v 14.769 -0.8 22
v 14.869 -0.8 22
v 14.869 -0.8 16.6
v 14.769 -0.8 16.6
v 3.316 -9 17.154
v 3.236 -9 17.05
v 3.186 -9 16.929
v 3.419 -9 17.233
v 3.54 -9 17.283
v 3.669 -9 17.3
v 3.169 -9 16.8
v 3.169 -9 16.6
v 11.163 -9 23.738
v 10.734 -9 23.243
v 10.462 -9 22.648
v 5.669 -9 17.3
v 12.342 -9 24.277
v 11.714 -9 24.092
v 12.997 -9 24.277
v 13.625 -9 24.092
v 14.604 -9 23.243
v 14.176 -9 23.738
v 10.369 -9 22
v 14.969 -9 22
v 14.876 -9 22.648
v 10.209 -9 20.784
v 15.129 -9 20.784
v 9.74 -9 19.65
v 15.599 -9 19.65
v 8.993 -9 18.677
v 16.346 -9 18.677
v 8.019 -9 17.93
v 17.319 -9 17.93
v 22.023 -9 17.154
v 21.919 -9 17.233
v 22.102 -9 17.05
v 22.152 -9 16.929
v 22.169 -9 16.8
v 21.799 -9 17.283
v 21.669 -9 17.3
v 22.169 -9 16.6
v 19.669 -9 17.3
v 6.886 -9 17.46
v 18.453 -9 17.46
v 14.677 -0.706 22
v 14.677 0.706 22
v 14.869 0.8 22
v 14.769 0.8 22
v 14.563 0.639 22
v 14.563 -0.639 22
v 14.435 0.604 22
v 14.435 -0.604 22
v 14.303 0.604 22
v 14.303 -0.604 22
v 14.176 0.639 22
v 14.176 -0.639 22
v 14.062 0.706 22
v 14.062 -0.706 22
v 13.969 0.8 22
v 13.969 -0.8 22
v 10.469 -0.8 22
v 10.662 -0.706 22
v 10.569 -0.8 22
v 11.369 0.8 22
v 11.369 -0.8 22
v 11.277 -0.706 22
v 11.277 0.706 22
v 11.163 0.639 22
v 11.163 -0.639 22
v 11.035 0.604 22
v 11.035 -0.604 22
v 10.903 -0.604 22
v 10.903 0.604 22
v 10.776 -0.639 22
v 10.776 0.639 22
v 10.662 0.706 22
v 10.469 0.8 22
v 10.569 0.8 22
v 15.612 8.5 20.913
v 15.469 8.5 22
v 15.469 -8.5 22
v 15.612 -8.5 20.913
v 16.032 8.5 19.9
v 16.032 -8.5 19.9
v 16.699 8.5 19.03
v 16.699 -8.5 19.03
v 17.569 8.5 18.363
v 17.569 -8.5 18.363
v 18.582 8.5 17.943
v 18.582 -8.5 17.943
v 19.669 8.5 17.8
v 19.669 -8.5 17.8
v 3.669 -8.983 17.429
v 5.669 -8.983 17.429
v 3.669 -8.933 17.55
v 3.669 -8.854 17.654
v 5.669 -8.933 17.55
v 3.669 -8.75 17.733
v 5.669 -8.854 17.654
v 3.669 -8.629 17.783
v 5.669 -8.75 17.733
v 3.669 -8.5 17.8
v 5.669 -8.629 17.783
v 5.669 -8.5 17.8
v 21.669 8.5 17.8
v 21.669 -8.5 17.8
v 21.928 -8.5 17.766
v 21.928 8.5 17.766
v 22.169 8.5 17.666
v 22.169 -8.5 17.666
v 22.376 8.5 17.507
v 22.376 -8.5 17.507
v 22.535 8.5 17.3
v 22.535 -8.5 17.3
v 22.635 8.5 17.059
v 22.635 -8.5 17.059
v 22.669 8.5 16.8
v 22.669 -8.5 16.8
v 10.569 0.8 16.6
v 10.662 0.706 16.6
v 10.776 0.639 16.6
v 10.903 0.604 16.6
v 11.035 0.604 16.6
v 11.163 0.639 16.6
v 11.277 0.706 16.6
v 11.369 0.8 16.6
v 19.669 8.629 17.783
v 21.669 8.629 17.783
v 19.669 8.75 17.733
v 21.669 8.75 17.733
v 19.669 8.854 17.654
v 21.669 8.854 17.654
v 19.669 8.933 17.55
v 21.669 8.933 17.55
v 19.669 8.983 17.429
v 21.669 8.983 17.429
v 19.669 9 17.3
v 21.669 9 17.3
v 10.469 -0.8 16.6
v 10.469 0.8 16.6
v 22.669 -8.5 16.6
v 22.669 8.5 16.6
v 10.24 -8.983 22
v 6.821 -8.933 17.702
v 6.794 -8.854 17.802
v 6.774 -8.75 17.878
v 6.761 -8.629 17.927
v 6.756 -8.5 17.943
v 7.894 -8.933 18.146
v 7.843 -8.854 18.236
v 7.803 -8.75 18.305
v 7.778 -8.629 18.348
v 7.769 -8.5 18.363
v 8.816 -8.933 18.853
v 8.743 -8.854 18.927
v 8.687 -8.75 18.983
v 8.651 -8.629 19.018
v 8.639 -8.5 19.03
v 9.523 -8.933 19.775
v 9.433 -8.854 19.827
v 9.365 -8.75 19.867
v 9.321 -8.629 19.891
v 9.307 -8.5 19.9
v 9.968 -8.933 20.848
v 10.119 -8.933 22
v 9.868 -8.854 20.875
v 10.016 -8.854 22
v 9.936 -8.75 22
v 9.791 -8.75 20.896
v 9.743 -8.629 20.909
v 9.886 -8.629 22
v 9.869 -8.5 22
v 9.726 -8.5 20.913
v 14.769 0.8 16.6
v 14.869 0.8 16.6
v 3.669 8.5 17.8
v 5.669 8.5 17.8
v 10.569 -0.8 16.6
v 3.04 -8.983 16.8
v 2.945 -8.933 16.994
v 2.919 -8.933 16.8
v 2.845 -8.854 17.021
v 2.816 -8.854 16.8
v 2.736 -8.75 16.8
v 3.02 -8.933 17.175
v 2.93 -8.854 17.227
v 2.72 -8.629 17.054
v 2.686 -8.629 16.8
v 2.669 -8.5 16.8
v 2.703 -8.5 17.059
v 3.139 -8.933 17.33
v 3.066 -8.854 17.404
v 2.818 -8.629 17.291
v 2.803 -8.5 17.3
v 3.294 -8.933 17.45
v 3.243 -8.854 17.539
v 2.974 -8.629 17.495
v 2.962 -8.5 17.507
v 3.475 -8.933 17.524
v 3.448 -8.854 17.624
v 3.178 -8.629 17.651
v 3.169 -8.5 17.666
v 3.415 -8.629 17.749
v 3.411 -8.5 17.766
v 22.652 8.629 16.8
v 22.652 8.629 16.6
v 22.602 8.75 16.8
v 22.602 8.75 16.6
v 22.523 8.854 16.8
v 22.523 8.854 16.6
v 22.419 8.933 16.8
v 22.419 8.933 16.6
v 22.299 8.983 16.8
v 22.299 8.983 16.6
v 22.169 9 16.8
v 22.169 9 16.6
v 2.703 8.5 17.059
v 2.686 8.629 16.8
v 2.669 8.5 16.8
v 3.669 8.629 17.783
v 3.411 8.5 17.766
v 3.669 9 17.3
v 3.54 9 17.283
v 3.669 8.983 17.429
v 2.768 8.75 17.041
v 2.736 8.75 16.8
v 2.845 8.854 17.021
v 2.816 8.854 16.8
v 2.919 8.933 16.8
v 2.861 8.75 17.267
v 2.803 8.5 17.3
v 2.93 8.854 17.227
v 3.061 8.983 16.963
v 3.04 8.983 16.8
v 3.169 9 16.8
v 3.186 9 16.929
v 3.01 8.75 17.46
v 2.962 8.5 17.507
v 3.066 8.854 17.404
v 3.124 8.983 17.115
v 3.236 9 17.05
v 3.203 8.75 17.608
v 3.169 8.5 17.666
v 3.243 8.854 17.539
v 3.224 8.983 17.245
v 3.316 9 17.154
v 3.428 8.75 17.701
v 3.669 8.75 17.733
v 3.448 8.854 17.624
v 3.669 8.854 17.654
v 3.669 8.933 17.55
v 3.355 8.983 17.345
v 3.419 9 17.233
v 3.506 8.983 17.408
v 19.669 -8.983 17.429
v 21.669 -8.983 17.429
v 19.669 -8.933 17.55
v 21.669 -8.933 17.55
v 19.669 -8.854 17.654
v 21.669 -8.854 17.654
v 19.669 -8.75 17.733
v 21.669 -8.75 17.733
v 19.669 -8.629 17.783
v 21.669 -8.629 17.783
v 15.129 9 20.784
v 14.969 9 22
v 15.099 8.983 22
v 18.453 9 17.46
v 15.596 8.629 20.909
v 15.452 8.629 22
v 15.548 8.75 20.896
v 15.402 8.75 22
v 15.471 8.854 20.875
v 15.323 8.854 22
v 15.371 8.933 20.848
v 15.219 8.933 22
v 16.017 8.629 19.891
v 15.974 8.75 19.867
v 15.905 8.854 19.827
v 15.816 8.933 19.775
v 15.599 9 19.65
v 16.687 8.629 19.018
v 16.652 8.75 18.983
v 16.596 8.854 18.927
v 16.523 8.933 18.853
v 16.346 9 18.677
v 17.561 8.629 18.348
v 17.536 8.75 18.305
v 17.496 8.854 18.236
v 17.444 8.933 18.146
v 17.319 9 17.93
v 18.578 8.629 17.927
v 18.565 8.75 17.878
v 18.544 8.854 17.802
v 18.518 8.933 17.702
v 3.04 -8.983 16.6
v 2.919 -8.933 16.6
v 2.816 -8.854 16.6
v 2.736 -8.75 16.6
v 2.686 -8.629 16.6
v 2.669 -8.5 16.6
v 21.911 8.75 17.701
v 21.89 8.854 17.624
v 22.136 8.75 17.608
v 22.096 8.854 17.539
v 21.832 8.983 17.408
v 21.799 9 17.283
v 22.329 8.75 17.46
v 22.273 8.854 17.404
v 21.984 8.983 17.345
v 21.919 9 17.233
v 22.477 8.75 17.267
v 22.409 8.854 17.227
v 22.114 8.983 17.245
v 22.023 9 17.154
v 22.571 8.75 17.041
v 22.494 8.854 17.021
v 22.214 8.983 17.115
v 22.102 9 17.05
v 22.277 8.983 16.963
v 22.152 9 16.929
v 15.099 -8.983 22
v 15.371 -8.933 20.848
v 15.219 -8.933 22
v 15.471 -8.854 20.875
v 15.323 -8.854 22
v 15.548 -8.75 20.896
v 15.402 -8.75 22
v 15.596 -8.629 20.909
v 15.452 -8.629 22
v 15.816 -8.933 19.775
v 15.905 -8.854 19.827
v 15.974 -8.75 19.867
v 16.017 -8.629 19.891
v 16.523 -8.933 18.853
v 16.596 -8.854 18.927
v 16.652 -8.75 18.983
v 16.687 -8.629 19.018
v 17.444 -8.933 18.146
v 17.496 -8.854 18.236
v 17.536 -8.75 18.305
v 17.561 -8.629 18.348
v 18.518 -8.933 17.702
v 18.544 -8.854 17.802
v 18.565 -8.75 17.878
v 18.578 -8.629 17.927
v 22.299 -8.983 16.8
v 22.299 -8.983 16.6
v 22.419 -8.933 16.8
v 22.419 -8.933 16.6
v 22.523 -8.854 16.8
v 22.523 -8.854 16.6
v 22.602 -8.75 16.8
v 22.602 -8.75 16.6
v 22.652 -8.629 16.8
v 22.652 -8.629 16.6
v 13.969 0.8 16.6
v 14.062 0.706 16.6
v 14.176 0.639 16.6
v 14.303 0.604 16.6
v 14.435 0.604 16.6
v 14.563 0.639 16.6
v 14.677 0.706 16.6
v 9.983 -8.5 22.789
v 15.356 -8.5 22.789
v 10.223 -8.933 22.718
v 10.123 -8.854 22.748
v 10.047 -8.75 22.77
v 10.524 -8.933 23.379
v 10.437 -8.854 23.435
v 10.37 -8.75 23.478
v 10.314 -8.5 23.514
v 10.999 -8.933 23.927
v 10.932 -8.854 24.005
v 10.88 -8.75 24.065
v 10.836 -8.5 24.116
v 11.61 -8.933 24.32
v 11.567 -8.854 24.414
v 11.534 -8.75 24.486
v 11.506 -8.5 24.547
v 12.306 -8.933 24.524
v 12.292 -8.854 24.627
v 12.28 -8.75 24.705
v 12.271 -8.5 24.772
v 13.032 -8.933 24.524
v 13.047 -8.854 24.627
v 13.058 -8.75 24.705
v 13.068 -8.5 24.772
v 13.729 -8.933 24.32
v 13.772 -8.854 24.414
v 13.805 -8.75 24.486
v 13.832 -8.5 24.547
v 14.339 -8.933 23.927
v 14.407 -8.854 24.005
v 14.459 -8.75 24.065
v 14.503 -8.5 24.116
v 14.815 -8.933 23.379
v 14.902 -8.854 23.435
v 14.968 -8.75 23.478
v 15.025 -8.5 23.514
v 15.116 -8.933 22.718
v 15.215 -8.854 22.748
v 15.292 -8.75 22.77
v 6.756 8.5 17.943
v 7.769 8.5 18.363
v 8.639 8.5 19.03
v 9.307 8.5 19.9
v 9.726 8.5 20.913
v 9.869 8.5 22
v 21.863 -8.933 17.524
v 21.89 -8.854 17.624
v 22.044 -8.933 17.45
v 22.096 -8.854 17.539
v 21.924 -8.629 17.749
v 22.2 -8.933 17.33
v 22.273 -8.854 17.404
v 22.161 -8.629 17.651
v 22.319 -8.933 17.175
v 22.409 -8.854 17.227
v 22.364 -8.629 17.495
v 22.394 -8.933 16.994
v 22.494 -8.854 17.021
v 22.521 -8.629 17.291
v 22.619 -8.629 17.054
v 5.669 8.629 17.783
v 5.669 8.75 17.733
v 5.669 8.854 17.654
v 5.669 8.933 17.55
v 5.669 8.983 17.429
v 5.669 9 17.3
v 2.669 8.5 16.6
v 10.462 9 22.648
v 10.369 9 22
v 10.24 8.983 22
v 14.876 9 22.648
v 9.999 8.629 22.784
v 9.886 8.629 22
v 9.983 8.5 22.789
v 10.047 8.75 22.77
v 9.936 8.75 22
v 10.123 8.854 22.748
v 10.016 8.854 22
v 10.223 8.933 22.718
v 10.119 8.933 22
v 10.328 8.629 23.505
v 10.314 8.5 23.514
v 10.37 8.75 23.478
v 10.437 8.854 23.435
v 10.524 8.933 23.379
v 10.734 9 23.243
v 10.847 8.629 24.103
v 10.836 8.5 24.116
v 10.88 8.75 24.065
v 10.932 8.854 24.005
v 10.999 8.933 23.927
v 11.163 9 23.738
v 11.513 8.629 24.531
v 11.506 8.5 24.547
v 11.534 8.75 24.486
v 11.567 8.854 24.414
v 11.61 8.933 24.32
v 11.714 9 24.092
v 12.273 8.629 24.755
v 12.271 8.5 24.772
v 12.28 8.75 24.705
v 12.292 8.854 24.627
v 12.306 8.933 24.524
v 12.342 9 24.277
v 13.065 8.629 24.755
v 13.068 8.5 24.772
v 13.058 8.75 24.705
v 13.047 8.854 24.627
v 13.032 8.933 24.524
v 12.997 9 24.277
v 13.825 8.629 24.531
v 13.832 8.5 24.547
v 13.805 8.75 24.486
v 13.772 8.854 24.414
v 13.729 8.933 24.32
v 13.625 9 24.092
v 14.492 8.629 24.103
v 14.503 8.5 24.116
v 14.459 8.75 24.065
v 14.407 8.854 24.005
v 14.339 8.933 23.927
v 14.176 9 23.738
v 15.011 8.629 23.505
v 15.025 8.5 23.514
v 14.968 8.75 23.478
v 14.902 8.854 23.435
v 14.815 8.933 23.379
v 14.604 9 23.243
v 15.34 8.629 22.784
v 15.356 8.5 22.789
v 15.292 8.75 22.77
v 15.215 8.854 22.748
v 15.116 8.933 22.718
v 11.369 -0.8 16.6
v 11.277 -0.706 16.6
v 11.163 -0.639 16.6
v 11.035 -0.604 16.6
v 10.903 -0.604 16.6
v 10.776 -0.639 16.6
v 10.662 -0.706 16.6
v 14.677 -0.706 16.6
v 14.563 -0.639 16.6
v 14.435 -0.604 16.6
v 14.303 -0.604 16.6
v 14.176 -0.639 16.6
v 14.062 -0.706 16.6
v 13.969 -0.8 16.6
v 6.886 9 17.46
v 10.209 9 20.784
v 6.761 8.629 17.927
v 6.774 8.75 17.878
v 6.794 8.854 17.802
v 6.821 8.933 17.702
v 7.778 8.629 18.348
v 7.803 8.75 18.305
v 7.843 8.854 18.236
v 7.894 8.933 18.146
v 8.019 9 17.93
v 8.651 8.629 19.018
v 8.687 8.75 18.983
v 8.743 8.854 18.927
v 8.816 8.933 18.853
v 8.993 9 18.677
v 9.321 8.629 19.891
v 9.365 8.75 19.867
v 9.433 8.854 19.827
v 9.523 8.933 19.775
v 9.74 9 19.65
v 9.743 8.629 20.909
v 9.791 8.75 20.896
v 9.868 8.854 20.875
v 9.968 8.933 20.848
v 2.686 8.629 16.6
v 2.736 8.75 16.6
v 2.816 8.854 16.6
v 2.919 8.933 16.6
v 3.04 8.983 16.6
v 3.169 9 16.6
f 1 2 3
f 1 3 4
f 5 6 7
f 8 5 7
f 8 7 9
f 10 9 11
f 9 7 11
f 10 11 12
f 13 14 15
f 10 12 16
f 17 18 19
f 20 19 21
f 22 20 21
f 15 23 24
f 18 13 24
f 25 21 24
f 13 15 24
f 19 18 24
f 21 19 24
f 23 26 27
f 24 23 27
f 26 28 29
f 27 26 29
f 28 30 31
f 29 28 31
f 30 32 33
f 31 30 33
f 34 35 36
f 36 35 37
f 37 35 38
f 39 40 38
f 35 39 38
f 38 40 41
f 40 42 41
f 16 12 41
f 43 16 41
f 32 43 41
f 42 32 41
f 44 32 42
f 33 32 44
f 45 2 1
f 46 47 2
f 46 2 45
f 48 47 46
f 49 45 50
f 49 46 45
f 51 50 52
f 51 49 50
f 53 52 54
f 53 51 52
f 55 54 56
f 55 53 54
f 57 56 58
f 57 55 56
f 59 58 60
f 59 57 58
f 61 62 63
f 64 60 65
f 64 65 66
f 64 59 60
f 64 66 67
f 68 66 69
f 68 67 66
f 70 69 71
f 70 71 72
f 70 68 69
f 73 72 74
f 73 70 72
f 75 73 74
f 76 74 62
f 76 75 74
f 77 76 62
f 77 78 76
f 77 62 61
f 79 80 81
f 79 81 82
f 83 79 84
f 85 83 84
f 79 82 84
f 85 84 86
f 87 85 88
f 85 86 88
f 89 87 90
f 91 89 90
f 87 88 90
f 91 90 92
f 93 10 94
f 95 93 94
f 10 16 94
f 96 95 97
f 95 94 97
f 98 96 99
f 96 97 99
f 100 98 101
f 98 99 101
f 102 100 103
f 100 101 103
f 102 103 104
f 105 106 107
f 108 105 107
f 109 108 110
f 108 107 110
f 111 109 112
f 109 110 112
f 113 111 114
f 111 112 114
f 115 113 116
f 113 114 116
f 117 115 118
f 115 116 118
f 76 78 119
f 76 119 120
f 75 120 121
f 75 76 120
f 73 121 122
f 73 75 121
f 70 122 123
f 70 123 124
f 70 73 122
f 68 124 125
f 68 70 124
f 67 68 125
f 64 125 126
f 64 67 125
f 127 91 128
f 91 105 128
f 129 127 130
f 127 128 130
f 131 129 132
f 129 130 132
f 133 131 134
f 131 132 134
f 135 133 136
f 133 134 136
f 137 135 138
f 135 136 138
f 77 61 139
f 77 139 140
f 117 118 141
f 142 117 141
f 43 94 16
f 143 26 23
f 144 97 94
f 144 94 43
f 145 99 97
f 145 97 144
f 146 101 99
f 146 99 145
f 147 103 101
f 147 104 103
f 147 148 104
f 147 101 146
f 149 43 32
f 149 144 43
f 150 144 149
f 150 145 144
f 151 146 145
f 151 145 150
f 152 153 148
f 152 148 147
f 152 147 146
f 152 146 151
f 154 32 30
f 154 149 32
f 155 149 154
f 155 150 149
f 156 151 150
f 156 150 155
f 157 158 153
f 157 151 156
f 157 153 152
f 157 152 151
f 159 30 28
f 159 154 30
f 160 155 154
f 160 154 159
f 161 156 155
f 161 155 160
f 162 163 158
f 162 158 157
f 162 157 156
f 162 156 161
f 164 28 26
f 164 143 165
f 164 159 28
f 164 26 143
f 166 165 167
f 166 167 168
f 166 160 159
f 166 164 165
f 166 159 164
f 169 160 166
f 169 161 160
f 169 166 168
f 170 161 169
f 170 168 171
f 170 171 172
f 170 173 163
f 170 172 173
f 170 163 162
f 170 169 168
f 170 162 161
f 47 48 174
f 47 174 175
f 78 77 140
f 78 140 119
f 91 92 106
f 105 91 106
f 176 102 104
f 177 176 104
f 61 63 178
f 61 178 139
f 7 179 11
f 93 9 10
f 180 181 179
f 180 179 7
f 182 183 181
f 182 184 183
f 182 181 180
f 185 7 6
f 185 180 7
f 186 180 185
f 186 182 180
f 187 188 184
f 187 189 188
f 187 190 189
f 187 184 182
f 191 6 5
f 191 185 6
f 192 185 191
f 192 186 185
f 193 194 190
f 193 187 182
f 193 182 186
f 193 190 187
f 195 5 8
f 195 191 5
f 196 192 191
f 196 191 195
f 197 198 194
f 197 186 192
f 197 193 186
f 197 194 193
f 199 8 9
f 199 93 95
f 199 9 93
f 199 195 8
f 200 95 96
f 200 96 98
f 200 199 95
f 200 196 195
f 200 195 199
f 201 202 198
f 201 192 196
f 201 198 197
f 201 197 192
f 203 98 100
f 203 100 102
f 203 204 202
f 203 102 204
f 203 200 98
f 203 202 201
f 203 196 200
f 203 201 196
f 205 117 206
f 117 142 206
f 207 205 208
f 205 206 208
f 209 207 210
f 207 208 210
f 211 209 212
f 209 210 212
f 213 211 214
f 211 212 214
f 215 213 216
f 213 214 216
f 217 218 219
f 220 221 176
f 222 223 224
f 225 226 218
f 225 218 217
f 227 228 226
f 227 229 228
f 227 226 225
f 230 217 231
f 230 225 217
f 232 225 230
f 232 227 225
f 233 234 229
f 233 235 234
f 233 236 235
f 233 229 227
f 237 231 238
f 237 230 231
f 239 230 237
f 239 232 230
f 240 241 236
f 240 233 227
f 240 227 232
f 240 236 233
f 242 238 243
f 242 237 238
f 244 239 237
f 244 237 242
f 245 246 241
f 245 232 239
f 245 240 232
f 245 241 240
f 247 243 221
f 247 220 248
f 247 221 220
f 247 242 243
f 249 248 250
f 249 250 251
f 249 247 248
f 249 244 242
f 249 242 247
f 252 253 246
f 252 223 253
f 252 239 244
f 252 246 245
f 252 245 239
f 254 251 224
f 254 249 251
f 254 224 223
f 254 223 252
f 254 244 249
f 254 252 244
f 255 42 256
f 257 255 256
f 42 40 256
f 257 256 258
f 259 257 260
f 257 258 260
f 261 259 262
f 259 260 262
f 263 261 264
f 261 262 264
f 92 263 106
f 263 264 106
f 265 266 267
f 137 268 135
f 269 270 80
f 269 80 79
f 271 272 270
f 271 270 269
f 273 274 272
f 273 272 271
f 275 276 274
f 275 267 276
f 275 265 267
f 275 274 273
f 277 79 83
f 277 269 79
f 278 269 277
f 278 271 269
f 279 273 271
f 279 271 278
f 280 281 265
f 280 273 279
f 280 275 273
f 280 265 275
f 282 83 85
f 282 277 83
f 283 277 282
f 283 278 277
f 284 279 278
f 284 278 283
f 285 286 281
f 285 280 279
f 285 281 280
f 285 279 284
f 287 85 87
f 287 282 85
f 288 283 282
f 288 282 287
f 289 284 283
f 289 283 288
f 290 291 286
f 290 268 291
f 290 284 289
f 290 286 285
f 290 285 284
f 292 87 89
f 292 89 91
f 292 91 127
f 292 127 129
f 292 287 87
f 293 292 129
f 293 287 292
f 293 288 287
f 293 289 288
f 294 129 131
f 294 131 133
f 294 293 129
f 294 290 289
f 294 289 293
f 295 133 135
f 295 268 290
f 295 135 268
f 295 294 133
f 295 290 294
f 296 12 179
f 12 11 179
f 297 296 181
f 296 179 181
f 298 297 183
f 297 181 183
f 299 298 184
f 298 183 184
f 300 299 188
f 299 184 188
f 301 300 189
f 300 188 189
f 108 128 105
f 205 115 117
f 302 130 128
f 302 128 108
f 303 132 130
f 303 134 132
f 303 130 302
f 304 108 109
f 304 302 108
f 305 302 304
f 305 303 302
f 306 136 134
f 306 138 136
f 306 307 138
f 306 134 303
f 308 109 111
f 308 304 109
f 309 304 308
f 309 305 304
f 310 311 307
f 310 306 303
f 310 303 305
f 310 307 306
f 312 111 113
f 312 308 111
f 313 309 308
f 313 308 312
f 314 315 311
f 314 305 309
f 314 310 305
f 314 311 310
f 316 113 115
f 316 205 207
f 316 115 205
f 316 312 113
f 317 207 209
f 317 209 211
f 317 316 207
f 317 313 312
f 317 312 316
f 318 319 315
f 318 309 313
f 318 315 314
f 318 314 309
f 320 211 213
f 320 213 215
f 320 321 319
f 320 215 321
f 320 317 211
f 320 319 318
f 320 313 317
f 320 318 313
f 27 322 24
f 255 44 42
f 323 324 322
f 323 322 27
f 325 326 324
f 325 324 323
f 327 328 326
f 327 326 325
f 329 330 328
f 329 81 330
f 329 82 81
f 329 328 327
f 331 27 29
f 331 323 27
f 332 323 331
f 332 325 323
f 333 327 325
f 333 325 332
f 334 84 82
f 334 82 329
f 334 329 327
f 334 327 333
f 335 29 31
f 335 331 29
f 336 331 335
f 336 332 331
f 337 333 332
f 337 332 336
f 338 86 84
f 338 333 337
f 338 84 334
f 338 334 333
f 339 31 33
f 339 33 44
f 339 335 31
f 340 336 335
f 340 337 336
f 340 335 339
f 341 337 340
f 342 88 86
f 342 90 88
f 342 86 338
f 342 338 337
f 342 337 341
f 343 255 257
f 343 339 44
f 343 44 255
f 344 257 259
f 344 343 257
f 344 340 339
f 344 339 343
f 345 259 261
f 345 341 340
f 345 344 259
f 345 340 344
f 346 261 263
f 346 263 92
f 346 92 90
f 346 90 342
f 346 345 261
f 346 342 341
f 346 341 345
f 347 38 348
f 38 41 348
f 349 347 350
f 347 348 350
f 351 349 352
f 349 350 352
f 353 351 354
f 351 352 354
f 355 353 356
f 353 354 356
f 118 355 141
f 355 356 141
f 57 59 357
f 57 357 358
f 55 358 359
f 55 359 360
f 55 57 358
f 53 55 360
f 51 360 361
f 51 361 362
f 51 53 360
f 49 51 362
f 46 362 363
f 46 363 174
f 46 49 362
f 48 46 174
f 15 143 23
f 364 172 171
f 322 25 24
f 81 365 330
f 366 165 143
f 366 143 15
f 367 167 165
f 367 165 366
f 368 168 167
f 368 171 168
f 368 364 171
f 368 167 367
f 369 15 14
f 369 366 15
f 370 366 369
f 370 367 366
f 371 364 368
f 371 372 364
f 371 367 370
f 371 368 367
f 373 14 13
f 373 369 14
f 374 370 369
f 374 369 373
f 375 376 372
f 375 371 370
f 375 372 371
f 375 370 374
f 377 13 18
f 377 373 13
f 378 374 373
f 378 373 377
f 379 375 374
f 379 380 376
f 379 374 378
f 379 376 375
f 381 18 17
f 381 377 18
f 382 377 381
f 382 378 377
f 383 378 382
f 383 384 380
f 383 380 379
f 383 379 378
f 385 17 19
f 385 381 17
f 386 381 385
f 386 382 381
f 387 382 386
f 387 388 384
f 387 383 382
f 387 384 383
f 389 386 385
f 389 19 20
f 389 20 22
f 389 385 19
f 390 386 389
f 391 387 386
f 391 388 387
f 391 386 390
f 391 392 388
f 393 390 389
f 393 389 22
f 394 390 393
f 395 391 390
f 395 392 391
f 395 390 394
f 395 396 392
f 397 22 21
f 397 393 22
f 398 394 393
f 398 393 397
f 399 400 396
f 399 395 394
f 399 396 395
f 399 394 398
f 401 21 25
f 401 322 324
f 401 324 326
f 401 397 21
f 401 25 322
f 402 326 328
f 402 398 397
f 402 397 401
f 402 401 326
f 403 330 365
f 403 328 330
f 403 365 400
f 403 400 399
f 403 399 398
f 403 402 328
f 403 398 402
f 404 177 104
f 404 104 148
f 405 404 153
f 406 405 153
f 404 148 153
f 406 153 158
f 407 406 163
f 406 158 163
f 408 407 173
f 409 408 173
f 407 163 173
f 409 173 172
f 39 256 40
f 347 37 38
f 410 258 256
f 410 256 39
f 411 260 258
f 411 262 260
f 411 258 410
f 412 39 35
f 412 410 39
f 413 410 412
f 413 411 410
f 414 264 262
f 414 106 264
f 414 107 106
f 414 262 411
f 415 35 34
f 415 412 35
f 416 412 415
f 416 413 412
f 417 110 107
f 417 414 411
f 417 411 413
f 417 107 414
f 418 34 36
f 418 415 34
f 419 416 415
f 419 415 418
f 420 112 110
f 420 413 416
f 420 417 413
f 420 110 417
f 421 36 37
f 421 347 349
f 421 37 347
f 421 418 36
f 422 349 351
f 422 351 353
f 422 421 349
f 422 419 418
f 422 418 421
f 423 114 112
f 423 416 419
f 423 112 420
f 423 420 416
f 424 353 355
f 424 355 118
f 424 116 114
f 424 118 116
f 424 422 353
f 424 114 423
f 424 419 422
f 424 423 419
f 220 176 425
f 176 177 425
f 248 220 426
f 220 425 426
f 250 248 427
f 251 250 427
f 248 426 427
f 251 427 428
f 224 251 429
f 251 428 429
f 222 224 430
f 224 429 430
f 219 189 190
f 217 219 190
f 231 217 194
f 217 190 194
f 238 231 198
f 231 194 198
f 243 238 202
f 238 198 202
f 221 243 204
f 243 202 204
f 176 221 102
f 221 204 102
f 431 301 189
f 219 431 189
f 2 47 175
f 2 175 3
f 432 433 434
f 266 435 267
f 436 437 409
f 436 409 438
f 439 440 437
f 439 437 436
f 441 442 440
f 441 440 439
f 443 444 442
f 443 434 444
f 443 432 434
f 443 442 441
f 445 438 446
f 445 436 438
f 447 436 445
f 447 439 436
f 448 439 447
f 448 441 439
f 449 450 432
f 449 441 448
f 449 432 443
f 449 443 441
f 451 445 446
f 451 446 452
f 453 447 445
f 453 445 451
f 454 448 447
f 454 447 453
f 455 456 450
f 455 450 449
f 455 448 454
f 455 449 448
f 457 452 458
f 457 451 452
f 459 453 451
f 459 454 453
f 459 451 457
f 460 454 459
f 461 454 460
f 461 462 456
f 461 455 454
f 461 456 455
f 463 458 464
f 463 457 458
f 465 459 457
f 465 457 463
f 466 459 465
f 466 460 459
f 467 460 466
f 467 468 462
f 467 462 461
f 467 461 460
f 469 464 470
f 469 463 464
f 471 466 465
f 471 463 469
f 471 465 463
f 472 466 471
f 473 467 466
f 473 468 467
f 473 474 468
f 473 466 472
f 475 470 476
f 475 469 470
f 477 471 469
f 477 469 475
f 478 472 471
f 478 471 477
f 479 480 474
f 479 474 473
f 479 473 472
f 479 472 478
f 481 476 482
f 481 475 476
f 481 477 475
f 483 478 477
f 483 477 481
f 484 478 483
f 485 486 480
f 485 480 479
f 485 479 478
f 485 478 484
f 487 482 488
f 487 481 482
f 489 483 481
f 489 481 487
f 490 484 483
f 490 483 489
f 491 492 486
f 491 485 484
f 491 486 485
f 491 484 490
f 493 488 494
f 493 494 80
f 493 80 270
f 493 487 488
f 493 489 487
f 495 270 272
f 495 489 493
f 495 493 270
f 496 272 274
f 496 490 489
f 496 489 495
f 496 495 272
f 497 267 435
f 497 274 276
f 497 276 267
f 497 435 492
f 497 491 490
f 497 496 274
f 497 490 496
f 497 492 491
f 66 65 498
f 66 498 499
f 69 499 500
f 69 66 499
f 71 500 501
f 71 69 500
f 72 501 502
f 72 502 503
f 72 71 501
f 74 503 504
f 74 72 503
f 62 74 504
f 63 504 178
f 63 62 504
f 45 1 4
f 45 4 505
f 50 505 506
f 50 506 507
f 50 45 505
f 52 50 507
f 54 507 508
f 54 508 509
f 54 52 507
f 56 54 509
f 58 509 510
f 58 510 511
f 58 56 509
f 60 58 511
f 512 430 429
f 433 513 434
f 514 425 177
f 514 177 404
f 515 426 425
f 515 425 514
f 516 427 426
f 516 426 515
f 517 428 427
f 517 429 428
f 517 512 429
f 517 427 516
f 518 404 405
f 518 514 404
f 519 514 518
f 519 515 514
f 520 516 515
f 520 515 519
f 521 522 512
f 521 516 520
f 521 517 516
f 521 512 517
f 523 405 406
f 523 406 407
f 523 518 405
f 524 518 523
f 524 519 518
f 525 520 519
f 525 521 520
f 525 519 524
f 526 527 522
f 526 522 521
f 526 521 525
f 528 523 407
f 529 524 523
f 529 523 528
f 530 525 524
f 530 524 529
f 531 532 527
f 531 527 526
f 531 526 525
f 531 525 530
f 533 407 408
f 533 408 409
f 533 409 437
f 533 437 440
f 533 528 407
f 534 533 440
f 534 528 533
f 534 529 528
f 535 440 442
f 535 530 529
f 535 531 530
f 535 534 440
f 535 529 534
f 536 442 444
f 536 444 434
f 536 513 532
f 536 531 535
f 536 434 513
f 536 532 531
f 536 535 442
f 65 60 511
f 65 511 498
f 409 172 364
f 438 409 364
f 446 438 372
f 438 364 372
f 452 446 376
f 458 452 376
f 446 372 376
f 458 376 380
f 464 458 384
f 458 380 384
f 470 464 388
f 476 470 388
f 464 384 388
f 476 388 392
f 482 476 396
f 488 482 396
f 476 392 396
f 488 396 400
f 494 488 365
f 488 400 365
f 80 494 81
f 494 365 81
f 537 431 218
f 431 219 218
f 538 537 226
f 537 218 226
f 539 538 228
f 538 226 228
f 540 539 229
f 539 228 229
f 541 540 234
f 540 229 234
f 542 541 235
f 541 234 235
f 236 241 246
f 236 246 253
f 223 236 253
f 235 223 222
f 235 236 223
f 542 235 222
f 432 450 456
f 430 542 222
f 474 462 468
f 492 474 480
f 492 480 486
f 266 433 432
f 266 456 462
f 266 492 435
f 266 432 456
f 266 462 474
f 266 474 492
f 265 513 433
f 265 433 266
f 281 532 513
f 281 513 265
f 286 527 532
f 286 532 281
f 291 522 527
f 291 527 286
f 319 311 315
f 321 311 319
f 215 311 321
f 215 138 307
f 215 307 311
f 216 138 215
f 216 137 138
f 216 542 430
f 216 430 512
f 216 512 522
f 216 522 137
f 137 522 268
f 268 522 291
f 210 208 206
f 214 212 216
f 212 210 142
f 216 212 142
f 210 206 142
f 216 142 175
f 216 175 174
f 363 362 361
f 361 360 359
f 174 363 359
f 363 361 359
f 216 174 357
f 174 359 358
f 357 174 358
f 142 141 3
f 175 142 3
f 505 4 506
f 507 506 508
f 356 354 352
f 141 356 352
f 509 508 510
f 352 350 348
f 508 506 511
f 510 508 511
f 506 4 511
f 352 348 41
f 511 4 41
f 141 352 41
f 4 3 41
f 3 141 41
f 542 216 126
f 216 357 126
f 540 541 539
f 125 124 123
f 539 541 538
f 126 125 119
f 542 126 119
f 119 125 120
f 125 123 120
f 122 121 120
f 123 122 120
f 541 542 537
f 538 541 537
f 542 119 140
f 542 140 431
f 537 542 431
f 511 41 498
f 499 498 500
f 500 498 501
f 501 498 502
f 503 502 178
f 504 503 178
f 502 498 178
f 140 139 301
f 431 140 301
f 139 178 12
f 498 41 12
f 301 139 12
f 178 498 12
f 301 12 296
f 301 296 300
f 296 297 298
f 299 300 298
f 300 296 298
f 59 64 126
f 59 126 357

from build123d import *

# Parameters (mm, degrees)
BOSS_EXTRUDE2_DEPTH = 9
FILLET1_R           = 0.5
CUT_EXTRUDE1_START  = -5.4
CUT_EXTRUDE1_DEPTH  = 5.4


with BuildPart() as part:
    # Sketch3 → Boss-Extrude2 (new body, symmetric)
    with BuildSketch(Plane(origin=(0, 0, 0), x_dir=(-1, 0, 0), z_dir=(0, -1, 0))):
        with BuildLine():
            Line((-12.669323516, -16.6), (-2.669323516, -16.6))
            Line((-2.669323516, -16.6), (-2.669323516, -16.8))
            ThreePointArc((-2.669323516, -16.8), (-2.962216735, -17.507106781), (-3.669323516, -17.8))
            Line((-3.669323516, -17.8), (-5.669323516, -17.8))
            ThreePointArc((-5.669323516, -17.8), (-8.639171997, -19.030151519), (-9.869323516, -22))
            ThreePointArc((-9.869323516, -22), (-12.669323516, -24.8), (-15.469323516, -22))
            ThreePointArc((-15.469323516, -22), (-16.699475035, -19.030151519), (-19.669323516, -17.8))
            Line((-19.669323516, -17.8), (-21.669323516, -17.8))
            ThreePointArc((-21.669323516, -17.8), (-22.376430297, -17.507106781), (-22.669323516, -16.8))
            Line((-22.669323516, -16.8), (-22.669323516, -16.6))
            Line((-22.669323516, -16.6), (-12.669323516, -16.6))
        make_face()
    extrude(amount=BOSS_EXTRUDE2_DEPTH, both=True)

    # Fillet1
    fillet1_edges = [part.edges().sort_by_distance(p)[0] for p in [
        (22.376430297, -9, 17.507106781),
        (2.669323516, 9, 16.7),
        (2.962216735, 9, 17.507106781),
        (4.669323516, 9, 17.8),
        (8.639171997, 9, 19.030151519),
        (12.669323516, 9, 24.8),
        (16.699475035, 9, 19.030151519),
        (20.669323516, 9, 17.8),
        (20.669323516, -9, 17.8),
        (22.376430297, 9, 17.507106781),
        (22.669323516, 9, 16.7),
        (16.699475035, -9, 19.030151519),
        (12.669323516, -9, 24.8),
        (8.639171997, -9, 19.030151519),
        (4.669323516, -9, 17.8),
        (2.962216735, -9, 17.507106781),
        (2.669323516, -9, 16.7),
        (22.669323516, -9, 16.7),
    ]]
    fillet(fillet1_edges, radius=FILLET1_R)

    # Sketch4 → Cut-Extrude1 (cut)
    with BuildSketch(Plane(origin=(0, 0, 16.6), x_dir=(-1, 0, 0), z_dir=(0, 0, -1)).offset(CUT_EXTRUDE1_START)):
        with BuildLine():
            Line((-14.869323516, 0.8), (-14.869323516, -0.8))
            Line((-14.869323516, -0.8), (-14.769323516, -0.8))
            ThreePointArc((-14.769323516, -0.8), (-14.369323516, -0.6), (-13.969323516, -0.8))
            Line((-13.969323516, -0.8), (-11.369323516, -0.8))
            ThreePointArc((-11.369323516, -0.8), (-10.969323516, -0.6), (-10.569323516, -0.8))
            Line((-10.569323516, -0.8), (-10.469323516, -0.8))
            Line((-10.469323516, -0.8), (-10.469323516, 0.8))
            Line((-10.469323516, 0.8), (-10.569323516, 0.8))
            ThreePointArc((-10.569323516, 0.8), (-10.969323516, 0.6), (-11.369323516, 0.8))
            Line((-11.369323516, 0.8), (-13.969323516, 0.8))
            ThreePointArc((-13.969323516, 0.8), (-14.369323516, 0.6), (-14.769323516, 0.8))
            Line((-14.769323516, 0.8), (-14.869323516, 0.8))
        make_face()
    extrude(amount=CUT_EXTRUDE1_DEPTH, mode=Mode.SUBTRACT)


solid = part.part
